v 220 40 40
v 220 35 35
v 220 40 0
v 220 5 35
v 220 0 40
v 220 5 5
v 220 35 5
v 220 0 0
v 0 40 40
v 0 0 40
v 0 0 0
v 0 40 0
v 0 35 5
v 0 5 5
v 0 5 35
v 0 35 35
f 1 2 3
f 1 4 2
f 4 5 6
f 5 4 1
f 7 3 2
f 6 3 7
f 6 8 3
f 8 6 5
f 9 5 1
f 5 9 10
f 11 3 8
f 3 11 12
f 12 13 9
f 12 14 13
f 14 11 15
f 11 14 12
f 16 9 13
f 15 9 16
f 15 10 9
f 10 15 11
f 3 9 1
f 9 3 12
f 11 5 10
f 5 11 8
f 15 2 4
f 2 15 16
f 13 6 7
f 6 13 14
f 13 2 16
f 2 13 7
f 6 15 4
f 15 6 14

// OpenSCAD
$fn = 32;

// ----------------------------------------------------------------------
// Box beam: 200-250 mm hollow beam
// ----------------------------------------------------------------------

// --- parameters (mm) ---
beam_l = 220;             // beam length, X
beam_w = 40;              // beam width, Y
beam_h = 40;              // beam height, Z
wall = 5;                 // wall thickness
fit_tol = 0.05;           // tolerance for press fits, mm
free_tol = 0.2;           // tolerance for clearance fits, mm

difference() {
  cube([beam_l, beam_w, beam_h]);
  translate([-1, wall, wall])
    cube([beam_l + 2, beam_w - 2 * wall, beam_h - 2 * wall]);
}
